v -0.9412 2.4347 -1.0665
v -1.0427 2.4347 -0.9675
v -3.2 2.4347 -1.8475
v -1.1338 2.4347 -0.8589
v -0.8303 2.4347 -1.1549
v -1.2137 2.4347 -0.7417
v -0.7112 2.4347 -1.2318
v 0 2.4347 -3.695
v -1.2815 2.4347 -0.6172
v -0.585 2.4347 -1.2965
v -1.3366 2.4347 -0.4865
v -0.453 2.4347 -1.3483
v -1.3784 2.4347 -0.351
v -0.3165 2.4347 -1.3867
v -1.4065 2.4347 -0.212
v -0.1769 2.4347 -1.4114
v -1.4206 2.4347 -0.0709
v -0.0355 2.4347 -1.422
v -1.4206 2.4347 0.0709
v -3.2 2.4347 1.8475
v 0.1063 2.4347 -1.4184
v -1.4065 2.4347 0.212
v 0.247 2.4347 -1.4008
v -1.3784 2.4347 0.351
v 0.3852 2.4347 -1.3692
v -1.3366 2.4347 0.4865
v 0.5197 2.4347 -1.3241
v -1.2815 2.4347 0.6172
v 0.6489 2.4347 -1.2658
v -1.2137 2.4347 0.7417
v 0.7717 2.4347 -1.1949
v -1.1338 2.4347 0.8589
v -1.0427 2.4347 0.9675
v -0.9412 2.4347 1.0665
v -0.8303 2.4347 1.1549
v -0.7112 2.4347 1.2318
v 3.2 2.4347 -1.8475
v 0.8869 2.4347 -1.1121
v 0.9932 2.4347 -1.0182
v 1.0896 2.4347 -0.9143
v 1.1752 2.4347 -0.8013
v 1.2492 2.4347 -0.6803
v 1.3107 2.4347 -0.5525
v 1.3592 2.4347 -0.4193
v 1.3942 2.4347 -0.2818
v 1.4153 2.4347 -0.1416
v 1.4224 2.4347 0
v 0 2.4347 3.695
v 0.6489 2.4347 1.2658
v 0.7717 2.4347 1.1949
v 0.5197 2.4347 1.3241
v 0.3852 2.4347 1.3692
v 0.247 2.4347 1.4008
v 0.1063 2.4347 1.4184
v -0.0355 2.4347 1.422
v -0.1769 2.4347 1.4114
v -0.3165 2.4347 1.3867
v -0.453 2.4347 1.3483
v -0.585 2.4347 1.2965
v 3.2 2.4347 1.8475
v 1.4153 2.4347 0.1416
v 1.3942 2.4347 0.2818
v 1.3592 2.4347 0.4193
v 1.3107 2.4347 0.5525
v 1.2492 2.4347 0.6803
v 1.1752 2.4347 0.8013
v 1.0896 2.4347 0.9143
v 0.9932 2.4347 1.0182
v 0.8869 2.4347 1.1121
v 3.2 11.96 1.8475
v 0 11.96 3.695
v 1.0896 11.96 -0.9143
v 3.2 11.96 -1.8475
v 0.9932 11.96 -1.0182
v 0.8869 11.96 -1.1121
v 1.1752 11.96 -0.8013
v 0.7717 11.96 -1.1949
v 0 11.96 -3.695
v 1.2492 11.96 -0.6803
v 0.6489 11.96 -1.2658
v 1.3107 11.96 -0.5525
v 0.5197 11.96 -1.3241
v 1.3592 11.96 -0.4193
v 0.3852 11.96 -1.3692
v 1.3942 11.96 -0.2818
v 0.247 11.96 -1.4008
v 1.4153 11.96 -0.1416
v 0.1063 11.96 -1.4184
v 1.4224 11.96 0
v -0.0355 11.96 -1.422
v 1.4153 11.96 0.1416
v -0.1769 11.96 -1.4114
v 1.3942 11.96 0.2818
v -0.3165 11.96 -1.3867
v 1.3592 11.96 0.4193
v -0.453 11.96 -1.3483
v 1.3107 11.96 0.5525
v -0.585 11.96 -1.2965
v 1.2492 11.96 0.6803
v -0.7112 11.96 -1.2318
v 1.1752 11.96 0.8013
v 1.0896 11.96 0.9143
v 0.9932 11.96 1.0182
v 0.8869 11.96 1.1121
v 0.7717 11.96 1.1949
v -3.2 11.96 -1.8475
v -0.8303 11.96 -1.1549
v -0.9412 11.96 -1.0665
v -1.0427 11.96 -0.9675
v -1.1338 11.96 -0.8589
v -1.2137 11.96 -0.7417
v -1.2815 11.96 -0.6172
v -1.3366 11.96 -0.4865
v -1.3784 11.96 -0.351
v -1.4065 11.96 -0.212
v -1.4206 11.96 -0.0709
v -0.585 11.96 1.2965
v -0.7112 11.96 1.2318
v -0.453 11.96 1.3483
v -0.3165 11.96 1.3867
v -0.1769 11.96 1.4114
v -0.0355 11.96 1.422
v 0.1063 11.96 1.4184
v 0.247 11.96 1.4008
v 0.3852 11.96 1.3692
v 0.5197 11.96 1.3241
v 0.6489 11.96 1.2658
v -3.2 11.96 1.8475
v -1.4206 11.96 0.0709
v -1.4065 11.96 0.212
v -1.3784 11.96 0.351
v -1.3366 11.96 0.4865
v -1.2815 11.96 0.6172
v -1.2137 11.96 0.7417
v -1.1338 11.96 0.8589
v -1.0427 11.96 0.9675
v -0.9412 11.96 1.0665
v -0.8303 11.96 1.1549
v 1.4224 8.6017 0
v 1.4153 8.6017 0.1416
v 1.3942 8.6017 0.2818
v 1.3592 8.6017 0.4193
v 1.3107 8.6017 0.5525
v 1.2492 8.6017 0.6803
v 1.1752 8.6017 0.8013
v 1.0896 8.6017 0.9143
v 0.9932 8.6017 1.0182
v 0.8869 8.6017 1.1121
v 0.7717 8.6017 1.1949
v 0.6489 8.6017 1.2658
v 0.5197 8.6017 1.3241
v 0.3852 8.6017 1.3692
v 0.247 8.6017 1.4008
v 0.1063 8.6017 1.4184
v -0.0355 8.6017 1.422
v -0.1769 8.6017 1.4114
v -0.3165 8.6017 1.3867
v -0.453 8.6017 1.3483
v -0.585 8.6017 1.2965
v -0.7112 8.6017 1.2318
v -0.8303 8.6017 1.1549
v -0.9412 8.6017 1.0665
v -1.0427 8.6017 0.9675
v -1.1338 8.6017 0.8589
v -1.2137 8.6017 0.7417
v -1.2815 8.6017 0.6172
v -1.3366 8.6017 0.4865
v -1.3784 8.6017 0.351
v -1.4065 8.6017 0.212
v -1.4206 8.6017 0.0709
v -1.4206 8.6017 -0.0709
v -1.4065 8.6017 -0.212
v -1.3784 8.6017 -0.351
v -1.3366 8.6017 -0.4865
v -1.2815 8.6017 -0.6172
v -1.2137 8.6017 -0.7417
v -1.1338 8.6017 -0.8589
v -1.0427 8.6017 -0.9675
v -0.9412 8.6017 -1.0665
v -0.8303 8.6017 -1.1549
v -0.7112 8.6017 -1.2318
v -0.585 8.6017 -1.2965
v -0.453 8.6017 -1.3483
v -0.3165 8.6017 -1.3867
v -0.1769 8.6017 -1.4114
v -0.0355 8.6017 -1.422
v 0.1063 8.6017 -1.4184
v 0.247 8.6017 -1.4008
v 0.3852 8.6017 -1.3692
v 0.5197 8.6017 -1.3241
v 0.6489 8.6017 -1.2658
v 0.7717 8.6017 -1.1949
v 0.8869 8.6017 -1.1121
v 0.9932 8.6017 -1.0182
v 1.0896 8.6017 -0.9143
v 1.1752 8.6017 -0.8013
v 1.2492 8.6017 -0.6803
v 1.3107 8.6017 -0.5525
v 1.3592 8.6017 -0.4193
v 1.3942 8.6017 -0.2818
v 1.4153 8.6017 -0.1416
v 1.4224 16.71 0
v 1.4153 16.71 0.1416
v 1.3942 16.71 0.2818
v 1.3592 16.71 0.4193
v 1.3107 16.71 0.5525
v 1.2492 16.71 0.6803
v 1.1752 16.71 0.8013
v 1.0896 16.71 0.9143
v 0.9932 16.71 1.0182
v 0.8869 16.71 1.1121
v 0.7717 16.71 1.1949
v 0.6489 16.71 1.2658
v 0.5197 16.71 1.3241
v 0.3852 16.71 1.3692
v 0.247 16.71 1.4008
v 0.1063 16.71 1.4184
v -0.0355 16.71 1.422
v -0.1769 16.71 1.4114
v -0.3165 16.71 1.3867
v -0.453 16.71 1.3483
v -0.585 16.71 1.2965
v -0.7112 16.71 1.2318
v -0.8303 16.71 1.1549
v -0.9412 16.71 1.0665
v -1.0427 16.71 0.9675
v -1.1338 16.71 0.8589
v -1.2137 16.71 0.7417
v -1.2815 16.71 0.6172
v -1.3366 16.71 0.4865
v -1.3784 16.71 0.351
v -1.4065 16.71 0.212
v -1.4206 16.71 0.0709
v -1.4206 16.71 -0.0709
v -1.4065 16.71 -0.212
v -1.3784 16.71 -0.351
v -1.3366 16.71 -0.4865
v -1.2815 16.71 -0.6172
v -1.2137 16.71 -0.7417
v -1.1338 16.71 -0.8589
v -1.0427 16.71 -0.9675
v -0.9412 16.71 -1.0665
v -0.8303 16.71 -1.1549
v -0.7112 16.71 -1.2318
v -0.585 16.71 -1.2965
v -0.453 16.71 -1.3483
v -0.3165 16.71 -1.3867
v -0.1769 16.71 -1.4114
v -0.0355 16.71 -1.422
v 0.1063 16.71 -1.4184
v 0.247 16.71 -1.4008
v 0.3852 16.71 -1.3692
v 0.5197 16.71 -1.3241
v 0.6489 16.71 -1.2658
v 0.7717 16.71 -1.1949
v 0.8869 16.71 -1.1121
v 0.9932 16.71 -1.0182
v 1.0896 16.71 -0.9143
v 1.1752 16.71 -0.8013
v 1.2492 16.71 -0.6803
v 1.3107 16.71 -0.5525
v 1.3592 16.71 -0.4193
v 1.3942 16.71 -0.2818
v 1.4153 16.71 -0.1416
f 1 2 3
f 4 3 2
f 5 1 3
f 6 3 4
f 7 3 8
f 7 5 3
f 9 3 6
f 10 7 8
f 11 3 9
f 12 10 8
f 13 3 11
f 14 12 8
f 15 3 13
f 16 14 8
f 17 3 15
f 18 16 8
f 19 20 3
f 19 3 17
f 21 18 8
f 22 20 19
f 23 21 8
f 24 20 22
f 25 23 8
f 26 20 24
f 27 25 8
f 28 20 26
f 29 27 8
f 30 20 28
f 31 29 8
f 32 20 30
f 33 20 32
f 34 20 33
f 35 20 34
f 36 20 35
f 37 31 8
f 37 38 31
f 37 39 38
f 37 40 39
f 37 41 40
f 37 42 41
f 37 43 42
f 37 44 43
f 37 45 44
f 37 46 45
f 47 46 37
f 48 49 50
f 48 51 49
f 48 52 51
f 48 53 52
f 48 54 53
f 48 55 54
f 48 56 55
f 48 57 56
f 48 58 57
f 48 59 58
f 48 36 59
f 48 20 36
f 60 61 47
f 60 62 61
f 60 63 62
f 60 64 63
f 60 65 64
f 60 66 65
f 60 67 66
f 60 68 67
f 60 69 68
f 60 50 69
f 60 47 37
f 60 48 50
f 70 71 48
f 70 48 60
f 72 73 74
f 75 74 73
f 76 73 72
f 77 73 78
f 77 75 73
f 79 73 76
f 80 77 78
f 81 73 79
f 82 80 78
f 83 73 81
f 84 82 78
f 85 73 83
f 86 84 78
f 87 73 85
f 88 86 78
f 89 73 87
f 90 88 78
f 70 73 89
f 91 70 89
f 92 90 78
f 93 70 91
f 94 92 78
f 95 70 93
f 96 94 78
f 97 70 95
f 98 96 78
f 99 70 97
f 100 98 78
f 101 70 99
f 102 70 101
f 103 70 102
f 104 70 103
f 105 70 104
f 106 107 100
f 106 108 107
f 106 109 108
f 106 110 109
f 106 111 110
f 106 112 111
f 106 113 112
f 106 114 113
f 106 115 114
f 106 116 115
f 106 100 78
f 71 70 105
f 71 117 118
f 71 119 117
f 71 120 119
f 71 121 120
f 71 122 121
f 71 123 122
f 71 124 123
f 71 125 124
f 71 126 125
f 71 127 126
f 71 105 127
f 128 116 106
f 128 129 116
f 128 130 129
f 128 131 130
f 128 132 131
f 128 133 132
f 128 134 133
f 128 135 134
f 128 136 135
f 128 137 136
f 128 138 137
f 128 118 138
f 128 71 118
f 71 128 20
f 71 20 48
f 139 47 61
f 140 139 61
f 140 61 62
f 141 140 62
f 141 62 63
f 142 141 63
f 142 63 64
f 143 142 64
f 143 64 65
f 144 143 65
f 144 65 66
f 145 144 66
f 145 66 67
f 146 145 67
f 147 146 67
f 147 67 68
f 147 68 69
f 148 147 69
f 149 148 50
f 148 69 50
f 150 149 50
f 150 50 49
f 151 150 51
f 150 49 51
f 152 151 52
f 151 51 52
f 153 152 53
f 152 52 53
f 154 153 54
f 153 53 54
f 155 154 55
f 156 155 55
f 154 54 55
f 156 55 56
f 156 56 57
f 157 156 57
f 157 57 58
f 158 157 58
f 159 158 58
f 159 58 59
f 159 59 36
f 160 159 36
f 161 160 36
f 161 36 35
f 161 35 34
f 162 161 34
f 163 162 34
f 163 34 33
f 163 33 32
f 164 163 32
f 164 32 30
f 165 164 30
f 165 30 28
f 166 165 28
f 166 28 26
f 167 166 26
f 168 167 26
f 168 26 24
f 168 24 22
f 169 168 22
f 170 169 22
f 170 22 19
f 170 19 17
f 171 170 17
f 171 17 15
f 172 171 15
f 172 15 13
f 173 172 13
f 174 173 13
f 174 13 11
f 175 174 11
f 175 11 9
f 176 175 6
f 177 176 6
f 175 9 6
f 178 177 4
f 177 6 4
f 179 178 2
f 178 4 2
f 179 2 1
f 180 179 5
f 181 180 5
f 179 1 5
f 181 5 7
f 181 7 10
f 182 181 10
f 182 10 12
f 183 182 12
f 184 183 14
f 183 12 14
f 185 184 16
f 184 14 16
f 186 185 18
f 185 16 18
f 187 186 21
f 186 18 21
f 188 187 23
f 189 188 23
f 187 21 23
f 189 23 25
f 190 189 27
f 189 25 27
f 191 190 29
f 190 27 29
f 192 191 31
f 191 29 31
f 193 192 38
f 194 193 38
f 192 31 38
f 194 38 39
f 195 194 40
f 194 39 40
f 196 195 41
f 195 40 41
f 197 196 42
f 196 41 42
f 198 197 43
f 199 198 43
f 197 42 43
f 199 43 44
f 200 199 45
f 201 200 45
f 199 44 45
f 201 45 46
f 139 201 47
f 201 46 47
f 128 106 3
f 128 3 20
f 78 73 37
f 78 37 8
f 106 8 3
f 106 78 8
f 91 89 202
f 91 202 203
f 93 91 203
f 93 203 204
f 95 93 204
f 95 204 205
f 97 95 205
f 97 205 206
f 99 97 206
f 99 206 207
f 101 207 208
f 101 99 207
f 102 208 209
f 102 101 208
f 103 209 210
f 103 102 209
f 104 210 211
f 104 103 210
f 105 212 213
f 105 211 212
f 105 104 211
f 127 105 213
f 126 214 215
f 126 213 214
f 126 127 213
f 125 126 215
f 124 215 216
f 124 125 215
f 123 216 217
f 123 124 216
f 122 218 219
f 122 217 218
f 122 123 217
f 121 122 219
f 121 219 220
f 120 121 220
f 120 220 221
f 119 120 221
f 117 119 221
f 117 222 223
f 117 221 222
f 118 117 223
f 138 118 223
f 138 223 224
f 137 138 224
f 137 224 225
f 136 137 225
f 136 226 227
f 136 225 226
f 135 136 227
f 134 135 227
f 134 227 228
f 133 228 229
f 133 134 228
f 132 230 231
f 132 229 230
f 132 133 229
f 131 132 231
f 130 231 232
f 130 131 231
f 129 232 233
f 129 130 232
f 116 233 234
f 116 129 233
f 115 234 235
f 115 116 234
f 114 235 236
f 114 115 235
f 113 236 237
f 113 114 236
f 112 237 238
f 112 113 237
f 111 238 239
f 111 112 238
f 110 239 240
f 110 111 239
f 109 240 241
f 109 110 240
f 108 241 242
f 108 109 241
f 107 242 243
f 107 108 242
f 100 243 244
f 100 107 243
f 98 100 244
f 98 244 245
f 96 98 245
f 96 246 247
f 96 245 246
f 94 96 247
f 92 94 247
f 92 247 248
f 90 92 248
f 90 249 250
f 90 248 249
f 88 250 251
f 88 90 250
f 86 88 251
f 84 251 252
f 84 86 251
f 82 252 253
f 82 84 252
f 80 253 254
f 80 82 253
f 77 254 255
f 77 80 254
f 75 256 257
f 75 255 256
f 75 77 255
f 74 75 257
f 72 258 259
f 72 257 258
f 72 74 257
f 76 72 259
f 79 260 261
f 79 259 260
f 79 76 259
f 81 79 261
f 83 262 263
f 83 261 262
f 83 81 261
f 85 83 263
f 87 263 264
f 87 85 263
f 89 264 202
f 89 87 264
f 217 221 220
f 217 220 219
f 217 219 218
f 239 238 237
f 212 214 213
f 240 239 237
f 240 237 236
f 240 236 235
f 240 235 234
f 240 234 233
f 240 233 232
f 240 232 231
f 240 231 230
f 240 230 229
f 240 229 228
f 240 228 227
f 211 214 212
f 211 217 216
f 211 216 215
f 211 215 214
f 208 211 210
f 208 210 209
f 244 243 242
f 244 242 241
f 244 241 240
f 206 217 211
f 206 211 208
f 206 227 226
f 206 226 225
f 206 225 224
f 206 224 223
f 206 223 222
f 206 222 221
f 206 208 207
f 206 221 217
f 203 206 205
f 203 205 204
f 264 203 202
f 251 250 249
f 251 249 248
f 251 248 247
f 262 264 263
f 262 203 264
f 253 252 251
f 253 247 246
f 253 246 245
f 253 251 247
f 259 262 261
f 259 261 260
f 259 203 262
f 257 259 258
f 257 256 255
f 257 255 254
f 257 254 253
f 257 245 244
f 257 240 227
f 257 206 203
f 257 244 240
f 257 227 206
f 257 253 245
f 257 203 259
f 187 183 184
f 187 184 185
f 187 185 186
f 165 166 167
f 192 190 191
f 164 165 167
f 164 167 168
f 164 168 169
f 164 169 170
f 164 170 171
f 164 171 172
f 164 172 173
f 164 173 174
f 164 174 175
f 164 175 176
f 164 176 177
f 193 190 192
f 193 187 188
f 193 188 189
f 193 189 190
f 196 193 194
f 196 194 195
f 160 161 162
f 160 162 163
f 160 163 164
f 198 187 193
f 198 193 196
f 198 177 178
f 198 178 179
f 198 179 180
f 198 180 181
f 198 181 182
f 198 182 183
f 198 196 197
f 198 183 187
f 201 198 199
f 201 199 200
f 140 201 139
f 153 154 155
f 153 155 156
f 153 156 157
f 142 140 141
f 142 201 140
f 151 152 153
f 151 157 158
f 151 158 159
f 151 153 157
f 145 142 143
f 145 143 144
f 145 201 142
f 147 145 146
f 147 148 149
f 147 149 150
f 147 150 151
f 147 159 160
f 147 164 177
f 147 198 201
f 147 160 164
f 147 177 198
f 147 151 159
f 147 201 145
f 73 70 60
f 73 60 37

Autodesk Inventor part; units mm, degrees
ref_plane "YZ Plane" through (0, 0, 0) normal (1, 0, 0) x (0, 1, 0)
ref_plane "XZ Plane" through (0, 0, 0) normal (0, 1, 0) x (-1, 0, 0)
ref_plane "XY Plane" through (0, 0, 0) normal (0, 0, 1) x (1, 0, 0)
sketch "Sketch1" plane through (0, 0, 0) normal (0, 1, 0) x (-1, 0, 0)
  line L0 (3.2, 1.8475) -> (3.2, -1.8475)
  line L1 (3.2, -1.8475) -> (0, -3.695)
  line L2 (0, -3.695) -> (-3.2, -1.8475)
  line L3 (-3.2, -1.8475) -> (-3.2, 1.8475)
  line L4 (-3.2, 1.8475) -> (0, 3.695)
  line L5 (0, 3.695) -> (3.2, 1.8475)
  point P0 (0, 0)
  point P1 (3.2, 0)
  point P2 (-3.2, 0)
  dimension "d0" = 6.4
  dimension "d1" = 120
  dimension "d2" = 6.4
extrude "Extrusion1" add sketch "Sketch1" along normal blind 11.96
sketch "Sketch2" plane through (0, 11.96, 0) normal (0, 1, 0) x (1, 0, 0)
  circle A0 centre (0, 0) radius 1.4224
  dimension "d5" = 2.8448
extrude "Extrusion2" add sketch "Sketch2" along normal blind 4.75
sketch "Sketch3" plane through (0, 0, 0) normal (0, -1, 0) x (1, 0, 0)
  circle A0 centre (0, 0) radius 1.4224
  dimension "d8" = 2.8448
extrude "Extrusion3" cut sketch "Sketch3" against normal blind 6.35
sketch "Sketch4" plane through (0, 0, 0) normal (0, -1, 0) x (1, 0, 0)
  circle A0 centre (0, 0) radius 1.4224 projected
  line L0 (-3.2, -1.8475) -> (-3.2, 1.8475) projected
  line L1 (0, -3.695) -> (-3.2, -1.8475) projected
  line L2 (3.2, -1.8475) -> (0, -3.695) projected
  line L3 (3.2, 1.8475) -> (3.2, -1.8475) projected
  line L4 (0, 3.695) -> (3.2, 1.8475) projected
  line L5 (-3.2, 1.8475) -> (0, 3.695) projected
extrude "Extrusion4" add sketch "Sketch4" along normal blind 8.6233
sketch "Sketch5" plane through (0, 6.35, 0) normal (0, -1, 0) x (1, 0, 0)
  circle A0 centre (0, 0) radius 1.4224 projected
extrude "Extrusion5" add sketch "Sketch5" along normal blind 8.6233
sketch "Sketch6" plane through (0, -8.6233, 0) normal (0, -1, 0) x (1, 0, 0)
  point P0 (0, 0)
sketch "Sketch7" plane through (0, -8.6233, 0) normal (0, -1, 0) x (1, 0, 0)
  line L0 (0, -3.695) -> (3.2, -1.8475) projected
  line L1 (3.2, -1.8475) -> (3.2, 1.8475) projected
  line L2 (3.2, 1.8475) -> (0, 3.695) projected
  line L3 (0, 3.695) -> (-3.2, 1.8475) projected
  line L4 (-3.2, 1.8475) -> (-3.2, -1.8475) projected
  line L5 (-3.2, -1.8475) -> (0, -3.695) projected
  circle A0 centre (0, 0) radius 1.4224 projected
extrude "Extrusion6" cut sketch "Sketch7" against normal blind 10
sketch "Sketch8" plane through (0, -2.2733, 0) normal (0, -1, 0) x (1, 0, 0)
  circle A0 centre (0, 0) radius 1.4224 projected
extrude "Extrusion7" cut sketch "Sketch8" against normal blind 9.817
sketch "Sketch9" plane through (0, 1.3767, 0) normal (0, -1, 0) x (1, 0, 0)
  line L0 (3.2, 1.8475) -> (3.2, -1.8475) projected
  line L1 (0, 3.695) -> (3.2, 1.8475) projected
  line L2 (-3.2, 1.8475) -> (0, 3.695) projected
  line L3 (-3.2, -1.8475) -> (-3.2, 1.8475) projected
  line L4 (0, -3.695) -> (-3.2, -1.8475) projected
  line L5 (3.2, -1.8475) -> (0, -3.695) projected
  circle A0 centre (0, 0) radius 1.4224 projected
  circle A1 centre (0, 0) radius 1.4224 projected
extrude "Extrusion8" cut sketch "Sketch9" against normal blind 1.058
sketch "Sketch10" plane through (0, 7.5437, 0) normal (0, -1, 0) x (1, 0, 0)
  circle A0 centre (0, 0) radius 1.4224 projected
extrude "Extrusion9" cut sketch "Sketch10" against normal blind 1.058
properties part number "pcBOBAstandoff" material "Stainless Steel"
